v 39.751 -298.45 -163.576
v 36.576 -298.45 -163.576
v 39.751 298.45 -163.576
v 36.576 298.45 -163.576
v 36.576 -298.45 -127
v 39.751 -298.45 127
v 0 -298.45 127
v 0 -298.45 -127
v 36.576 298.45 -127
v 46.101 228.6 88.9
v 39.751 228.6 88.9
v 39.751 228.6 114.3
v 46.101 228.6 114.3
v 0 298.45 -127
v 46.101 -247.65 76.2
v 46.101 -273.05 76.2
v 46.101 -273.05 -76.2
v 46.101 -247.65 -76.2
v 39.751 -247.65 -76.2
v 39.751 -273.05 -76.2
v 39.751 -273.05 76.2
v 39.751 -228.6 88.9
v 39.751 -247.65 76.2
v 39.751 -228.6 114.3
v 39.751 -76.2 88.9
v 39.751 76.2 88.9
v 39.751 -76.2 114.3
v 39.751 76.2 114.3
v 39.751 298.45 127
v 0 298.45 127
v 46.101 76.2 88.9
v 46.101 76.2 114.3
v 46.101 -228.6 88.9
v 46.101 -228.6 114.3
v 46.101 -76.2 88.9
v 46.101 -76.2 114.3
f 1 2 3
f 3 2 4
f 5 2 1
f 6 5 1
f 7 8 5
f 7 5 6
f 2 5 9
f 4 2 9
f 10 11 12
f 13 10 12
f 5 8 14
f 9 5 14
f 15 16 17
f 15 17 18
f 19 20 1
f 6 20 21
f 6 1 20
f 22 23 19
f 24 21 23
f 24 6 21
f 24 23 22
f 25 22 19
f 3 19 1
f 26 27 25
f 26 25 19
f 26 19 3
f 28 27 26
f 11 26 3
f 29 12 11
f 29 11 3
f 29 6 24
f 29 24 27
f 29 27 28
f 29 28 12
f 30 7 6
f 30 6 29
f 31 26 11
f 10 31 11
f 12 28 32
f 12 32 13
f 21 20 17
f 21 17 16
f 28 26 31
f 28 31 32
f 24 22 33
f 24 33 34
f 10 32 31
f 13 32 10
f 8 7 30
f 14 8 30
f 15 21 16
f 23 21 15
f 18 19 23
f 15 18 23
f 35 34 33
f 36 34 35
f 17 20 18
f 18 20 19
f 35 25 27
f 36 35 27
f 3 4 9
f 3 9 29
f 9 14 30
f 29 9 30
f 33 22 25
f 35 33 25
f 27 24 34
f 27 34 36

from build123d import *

# Parameters (mm, degrees)
F0_W     = 596.9
F0_H     = 254
F1_DEPTH = 36.576
F2_W     = 596.9
F2_H     = 290.576
F3_DEPTH = 3.175
F4_W     = 152.4
F4_H     = 25.4
F4_W_2   = 25.4
F4_H_2   = 152.4
F5_DEPTH = 6.35


with BuildPart() as f1:
    # F0 (on Right) → F1 (new body)
    with BuildSketch(Plane.YZ):
        Rectangle(F0_W, F0_H)
    extrude(amount=F1_DEPTH)

    # F2 (on face) → F3 (join)
    with BuildSketch(Plane.YZ.offset(36.576)):
        with Locations((0, -18.288)):
            Rectangle(F2_W, F2_H)
    extrude(amount=F3_DEPTH)

    # F4 (on face) → F5 (join)
    with BuildSketch(Plane.YZ.offset(39.751)):
        with Locations((152.4, 101.6)):
            Rectangle(F4_W, F4_H)
        with Locations((-260.35, 0)):
            Rectangle(F4_W_2, F4_H_2)
        with Locations((-152.4, 101.6)):
            Rectangle(F4_W, F4_H)
    extrude(amount=F5_DEPTH)


solid = f1.part
